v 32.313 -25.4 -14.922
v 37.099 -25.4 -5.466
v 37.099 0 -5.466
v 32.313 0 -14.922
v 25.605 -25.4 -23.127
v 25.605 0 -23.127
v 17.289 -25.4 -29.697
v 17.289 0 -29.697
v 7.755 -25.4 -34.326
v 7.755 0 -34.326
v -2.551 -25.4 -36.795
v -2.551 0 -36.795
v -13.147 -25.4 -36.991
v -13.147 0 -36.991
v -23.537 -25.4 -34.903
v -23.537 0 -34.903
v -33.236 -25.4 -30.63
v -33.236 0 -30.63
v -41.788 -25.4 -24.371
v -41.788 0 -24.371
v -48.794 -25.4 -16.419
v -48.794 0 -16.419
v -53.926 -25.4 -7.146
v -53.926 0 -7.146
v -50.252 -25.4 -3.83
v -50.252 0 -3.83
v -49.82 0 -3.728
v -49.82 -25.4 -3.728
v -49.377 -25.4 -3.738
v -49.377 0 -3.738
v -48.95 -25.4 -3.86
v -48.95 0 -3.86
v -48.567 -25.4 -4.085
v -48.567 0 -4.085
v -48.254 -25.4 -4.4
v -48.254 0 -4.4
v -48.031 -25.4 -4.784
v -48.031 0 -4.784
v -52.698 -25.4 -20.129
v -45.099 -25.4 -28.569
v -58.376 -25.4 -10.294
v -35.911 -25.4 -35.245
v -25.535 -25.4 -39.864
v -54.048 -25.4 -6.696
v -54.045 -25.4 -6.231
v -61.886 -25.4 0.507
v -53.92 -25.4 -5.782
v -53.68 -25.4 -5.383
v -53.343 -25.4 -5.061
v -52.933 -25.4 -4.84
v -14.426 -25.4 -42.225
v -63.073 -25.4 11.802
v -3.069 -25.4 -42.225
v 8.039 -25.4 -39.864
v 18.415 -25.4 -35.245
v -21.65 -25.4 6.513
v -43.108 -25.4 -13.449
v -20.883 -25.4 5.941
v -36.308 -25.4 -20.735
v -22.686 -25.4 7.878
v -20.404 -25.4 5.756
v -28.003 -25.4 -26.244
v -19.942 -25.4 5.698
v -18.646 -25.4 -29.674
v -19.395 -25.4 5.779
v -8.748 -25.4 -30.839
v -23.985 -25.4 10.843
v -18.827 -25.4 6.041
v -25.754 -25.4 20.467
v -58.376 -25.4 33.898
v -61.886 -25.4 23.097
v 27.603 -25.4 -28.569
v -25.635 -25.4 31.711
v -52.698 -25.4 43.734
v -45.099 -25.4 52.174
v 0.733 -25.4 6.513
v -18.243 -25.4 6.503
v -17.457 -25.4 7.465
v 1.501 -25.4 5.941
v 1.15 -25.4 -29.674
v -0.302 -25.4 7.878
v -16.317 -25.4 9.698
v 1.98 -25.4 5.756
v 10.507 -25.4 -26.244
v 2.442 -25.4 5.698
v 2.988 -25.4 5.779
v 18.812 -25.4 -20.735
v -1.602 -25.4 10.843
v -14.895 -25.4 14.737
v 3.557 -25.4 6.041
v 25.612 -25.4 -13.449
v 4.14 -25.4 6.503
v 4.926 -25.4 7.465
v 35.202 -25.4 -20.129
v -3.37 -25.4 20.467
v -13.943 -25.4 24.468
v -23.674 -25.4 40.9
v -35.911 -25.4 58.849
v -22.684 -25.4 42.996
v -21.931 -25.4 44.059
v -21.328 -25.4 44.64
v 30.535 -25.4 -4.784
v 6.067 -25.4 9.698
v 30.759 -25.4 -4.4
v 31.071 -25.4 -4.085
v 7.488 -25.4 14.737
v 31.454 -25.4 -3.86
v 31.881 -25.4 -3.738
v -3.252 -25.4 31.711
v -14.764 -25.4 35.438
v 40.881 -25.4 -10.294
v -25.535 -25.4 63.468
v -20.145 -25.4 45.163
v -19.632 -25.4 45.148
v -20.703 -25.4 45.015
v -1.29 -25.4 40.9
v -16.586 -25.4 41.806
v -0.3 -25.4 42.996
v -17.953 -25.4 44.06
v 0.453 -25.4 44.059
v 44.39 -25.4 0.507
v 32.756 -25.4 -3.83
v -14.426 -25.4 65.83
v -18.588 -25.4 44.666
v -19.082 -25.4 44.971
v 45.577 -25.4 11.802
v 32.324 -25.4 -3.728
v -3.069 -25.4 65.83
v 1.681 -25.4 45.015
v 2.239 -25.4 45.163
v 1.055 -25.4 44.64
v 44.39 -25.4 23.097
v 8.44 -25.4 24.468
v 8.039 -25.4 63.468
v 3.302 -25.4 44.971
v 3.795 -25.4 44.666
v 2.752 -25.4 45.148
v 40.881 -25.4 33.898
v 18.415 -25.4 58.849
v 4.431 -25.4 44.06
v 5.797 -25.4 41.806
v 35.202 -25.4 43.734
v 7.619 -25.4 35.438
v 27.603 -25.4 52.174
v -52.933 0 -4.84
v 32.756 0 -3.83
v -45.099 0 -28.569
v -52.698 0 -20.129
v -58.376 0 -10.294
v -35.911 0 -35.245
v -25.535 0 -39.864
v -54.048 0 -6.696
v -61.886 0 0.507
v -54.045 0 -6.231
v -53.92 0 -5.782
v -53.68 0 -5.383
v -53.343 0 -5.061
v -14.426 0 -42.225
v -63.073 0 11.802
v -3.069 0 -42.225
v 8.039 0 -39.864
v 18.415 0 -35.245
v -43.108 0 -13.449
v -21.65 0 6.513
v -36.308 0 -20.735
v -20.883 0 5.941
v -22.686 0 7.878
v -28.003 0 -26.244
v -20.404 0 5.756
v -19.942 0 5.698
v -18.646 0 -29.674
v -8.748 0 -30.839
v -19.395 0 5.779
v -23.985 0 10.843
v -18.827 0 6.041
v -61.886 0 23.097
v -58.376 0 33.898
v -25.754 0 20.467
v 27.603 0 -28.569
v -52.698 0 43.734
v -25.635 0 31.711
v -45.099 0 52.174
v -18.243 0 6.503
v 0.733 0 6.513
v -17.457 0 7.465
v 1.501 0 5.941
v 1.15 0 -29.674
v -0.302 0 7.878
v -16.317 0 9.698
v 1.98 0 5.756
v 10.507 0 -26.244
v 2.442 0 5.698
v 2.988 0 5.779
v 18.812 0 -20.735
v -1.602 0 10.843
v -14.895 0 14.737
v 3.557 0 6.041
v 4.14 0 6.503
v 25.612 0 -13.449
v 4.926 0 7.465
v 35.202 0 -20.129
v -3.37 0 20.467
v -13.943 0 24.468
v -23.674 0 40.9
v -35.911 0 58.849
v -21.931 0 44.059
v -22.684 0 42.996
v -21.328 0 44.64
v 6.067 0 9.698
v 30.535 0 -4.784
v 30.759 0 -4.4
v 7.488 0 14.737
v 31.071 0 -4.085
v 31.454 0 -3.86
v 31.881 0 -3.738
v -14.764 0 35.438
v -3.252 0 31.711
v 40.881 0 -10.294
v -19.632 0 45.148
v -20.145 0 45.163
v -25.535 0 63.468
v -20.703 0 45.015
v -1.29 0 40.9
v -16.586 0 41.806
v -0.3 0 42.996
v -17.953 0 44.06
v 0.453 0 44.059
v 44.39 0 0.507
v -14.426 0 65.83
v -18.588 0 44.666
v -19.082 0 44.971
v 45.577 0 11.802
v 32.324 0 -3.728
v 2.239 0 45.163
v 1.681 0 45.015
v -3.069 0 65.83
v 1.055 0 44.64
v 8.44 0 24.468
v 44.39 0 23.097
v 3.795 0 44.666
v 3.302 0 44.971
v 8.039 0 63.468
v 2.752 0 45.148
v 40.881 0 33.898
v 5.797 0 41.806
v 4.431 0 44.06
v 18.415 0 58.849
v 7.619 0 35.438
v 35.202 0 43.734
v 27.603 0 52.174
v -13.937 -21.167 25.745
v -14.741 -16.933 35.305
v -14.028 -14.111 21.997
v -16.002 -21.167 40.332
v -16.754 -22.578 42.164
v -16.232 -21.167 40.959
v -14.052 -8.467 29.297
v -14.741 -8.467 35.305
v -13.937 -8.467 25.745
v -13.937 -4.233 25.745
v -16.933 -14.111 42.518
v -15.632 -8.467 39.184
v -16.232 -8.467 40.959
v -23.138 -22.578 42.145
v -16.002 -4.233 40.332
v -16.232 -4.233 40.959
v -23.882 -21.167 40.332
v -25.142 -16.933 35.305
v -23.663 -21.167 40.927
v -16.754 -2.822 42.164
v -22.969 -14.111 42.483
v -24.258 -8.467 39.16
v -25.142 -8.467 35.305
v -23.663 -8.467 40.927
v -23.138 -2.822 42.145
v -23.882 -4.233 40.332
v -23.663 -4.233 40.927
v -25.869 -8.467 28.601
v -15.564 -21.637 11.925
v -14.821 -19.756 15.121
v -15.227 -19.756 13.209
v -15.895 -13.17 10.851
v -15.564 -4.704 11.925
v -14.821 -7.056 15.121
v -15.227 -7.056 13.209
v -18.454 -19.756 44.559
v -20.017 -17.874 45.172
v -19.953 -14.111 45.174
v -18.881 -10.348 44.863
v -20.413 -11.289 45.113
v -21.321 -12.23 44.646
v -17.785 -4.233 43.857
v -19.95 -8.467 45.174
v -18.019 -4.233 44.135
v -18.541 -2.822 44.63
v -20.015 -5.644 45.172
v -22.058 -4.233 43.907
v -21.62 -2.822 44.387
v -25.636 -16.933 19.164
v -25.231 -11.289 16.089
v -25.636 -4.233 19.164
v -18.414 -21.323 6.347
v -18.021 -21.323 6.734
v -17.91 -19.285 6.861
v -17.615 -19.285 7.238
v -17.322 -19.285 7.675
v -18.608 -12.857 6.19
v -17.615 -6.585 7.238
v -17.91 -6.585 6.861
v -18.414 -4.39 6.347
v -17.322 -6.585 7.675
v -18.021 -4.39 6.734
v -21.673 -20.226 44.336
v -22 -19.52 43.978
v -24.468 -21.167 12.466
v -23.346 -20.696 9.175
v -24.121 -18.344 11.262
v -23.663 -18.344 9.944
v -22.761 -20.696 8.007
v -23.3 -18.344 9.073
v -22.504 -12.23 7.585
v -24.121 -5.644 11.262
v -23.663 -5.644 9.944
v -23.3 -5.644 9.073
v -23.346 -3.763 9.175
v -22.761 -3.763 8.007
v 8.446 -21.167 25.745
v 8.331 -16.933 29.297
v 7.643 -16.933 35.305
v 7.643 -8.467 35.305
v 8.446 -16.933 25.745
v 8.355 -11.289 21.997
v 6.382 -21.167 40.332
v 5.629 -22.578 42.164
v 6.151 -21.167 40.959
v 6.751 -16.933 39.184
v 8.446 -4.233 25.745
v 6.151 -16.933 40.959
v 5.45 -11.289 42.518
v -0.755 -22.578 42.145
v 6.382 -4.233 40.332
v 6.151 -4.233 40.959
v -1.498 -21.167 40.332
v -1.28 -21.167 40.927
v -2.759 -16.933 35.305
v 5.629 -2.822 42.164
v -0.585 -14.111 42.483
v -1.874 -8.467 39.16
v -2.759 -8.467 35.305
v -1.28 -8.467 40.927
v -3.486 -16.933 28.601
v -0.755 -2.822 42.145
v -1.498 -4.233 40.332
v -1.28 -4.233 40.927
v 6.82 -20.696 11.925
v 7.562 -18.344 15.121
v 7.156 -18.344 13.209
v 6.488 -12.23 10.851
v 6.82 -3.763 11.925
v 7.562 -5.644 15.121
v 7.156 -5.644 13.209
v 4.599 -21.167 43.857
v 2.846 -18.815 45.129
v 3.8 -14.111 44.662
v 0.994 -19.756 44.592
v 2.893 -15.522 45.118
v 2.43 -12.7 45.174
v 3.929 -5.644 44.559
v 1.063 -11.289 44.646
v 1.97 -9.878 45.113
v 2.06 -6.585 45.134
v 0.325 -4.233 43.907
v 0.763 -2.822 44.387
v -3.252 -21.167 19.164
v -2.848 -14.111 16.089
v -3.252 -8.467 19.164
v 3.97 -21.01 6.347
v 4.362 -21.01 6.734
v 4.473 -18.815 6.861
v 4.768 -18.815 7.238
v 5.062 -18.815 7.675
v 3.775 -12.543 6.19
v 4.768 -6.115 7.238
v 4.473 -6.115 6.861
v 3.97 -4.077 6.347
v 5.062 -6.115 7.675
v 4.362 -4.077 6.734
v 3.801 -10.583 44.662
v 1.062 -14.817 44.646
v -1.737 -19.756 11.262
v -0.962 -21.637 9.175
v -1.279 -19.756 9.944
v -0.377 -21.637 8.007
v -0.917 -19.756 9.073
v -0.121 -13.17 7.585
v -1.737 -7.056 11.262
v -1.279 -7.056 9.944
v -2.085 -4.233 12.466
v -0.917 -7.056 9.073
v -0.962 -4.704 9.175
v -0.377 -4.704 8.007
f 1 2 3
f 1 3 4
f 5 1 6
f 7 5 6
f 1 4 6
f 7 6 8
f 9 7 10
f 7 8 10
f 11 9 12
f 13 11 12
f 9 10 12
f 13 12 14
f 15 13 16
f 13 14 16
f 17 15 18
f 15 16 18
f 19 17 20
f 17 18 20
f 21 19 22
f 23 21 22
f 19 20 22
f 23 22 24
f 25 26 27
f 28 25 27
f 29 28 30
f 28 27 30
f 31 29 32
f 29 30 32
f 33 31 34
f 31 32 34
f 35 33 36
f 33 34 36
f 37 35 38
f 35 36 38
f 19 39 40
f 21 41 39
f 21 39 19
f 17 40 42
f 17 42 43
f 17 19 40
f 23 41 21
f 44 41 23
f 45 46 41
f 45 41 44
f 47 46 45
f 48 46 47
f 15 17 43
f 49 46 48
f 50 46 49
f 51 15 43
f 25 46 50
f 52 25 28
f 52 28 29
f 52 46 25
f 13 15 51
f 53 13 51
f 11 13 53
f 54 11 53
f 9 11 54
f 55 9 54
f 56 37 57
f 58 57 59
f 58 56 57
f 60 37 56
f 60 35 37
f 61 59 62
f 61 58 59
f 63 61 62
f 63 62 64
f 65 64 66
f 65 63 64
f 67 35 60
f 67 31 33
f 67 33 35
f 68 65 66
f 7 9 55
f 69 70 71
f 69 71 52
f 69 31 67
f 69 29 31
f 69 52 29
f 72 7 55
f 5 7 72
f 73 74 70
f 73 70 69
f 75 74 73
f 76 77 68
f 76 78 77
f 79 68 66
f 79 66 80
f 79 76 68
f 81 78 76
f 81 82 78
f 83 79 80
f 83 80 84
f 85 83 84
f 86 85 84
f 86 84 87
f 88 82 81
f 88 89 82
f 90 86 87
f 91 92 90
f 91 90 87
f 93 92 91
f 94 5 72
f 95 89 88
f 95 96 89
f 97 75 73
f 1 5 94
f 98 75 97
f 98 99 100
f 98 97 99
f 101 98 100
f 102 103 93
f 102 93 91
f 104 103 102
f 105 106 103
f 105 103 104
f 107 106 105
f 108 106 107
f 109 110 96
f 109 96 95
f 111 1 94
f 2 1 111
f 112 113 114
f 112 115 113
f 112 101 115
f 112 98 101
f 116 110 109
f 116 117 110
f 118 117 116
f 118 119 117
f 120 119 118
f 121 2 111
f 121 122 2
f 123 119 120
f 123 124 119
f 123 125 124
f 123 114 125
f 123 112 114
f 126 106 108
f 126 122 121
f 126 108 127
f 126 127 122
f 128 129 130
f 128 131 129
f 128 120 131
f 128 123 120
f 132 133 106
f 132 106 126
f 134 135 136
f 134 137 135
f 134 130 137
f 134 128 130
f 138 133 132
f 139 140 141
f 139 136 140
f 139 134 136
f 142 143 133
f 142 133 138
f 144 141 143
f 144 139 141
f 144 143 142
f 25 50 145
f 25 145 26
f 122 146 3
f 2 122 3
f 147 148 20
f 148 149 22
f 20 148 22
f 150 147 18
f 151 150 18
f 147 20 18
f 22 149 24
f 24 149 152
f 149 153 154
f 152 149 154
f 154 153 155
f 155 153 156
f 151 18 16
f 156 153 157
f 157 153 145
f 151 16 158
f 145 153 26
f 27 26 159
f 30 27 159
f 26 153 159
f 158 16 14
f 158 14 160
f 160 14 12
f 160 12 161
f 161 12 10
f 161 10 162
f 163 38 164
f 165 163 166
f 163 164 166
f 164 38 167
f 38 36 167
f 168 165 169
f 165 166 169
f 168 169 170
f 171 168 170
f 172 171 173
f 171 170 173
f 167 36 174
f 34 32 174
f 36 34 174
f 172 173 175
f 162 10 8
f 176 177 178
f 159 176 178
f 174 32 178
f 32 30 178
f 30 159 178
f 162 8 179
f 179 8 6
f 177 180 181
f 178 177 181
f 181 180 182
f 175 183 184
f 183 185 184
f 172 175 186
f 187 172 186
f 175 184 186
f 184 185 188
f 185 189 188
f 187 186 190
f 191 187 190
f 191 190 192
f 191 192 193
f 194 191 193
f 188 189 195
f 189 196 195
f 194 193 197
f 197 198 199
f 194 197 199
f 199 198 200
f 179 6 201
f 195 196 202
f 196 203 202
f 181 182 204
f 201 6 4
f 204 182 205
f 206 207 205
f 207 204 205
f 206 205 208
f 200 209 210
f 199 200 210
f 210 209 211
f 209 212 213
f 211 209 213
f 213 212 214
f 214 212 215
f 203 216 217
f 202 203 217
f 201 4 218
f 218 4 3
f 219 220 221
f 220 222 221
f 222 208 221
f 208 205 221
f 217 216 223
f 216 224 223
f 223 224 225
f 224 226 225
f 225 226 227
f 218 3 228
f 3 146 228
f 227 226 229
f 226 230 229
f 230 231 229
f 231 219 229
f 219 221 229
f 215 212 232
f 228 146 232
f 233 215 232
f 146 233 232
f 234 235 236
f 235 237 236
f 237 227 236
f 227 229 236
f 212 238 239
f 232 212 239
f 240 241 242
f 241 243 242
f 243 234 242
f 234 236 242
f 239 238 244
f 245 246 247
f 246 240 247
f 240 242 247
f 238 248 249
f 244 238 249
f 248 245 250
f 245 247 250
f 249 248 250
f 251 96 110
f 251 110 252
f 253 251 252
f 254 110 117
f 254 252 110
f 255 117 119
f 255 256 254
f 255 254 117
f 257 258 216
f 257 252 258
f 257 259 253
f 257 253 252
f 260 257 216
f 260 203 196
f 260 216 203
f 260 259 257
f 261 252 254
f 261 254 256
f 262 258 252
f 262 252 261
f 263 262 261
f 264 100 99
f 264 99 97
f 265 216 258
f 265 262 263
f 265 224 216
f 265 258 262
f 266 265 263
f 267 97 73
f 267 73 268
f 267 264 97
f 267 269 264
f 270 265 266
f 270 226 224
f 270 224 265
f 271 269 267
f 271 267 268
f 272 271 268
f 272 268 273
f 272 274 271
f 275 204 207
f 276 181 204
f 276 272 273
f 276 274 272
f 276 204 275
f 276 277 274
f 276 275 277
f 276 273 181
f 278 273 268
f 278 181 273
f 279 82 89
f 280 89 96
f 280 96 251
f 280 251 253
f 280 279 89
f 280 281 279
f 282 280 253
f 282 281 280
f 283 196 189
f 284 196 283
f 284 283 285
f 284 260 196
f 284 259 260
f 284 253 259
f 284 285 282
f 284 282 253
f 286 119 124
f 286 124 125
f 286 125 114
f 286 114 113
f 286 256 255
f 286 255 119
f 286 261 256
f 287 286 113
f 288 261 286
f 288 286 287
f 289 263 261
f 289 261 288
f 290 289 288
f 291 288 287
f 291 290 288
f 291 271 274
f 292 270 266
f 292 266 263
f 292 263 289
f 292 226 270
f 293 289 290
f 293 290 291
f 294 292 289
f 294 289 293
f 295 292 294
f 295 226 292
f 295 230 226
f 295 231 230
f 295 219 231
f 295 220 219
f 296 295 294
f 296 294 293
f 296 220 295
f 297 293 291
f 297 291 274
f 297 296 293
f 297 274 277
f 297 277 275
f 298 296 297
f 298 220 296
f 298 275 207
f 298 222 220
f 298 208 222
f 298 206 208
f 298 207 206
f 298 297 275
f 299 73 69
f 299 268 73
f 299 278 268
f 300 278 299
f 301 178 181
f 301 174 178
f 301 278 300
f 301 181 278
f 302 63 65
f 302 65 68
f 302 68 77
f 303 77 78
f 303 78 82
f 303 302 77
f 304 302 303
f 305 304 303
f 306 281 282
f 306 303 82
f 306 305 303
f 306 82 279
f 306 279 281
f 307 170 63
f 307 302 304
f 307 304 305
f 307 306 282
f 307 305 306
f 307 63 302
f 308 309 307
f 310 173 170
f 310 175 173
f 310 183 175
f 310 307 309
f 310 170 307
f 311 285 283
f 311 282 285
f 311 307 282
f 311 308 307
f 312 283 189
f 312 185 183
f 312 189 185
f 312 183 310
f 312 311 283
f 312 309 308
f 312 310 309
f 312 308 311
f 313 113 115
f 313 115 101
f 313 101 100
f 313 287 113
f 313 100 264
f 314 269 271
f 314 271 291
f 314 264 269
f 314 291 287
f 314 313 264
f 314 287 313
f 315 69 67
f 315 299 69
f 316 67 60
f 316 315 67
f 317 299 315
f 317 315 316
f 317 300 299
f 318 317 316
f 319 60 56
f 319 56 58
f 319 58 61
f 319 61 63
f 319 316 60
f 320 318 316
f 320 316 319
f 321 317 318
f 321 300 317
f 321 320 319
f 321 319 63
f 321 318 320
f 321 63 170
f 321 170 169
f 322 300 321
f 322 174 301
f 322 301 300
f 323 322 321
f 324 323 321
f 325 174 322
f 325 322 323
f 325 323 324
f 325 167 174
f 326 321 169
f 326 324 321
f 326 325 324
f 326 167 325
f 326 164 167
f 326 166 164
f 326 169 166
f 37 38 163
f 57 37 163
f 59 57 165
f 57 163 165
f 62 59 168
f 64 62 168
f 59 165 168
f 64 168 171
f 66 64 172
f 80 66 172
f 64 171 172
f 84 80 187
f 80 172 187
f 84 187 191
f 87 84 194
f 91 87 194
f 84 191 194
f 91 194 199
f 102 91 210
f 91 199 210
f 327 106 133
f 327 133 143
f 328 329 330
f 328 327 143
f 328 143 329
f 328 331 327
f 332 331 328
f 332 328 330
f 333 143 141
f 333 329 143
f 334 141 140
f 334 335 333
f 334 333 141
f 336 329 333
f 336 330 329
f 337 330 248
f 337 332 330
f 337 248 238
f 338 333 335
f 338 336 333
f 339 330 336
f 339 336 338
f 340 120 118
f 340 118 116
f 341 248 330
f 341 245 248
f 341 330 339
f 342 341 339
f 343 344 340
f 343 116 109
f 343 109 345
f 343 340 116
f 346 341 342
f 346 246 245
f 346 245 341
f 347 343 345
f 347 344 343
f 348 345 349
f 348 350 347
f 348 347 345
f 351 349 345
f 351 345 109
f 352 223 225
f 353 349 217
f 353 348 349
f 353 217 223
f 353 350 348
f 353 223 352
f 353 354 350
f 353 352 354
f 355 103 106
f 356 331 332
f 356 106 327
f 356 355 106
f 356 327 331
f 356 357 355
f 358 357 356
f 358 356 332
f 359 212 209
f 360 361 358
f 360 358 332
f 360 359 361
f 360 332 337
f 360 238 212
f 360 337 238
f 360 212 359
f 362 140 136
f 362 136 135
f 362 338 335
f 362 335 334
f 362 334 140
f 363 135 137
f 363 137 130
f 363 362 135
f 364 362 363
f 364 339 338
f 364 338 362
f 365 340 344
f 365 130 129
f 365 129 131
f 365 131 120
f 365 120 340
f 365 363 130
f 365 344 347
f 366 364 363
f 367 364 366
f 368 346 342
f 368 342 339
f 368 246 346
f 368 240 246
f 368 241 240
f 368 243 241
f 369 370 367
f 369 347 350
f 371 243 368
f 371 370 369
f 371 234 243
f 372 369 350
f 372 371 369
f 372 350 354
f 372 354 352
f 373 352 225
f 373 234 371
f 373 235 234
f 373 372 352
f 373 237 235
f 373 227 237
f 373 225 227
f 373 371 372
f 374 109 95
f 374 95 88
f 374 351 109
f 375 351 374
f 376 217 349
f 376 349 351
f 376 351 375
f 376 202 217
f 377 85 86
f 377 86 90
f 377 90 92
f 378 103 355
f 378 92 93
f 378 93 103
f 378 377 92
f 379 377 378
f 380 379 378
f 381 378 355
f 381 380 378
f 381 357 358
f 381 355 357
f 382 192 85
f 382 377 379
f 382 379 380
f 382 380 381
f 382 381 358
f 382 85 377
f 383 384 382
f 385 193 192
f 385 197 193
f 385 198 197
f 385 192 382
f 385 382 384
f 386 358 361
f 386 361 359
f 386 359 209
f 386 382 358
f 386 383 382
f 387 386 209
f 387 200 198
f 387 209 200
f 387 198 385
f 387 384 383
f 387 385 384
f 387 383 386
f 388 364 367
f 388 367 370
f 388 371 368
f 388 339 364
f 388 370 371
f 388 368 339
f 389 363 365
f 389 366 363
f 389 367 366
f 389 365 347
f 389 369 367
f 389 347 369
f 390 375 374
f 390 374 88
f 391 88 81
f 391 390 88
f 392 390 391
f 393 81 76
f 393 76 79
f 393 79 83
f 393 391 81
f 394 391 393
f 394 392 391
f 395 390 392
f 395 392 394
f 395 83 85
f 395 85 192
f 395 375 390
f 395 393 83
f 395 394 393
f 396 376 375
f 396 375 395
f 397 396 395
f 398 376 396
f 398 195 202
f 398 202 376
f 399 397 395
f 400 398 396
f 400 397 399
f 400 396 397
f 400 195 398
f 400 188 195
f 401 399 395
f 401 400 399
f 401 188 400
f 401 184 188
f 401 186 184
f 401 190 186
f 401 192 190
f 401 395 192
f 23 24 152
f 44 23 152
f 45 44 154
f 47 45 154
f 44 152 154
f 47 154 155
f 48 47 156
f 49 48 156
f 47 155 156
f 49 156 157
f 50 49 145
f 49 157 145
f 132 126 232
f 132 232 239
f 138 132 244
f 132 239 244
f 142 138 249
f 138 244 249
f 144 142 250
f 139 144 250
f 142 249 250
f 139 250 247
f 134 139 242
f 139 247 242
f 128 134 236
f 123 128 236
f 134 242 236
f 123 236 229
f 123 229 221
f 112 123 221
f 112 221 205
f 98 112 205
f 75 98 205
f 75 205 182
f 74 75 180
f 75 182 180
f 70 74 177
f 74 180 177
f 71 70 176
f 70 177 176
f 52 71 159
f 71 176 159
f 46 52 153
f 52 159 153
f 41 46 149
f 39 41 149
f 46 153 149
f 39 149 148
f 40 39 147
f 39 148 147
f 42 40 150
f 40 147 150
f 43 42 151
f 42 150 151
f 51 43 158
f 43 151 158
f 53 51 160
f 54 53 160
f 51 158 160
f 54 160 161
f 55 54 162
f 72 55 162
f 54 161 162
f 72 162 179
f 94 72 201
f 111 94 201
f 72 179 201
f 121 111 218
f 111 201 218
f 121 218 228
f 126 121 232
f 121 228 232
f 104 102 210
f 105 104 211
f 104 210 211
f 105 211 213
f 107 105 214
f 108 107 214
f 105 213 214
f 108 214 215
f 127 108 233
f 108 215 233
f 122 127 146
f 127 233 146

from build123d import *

# Parameters (mm, degrees)
F0_R     = 54.325127
F1_DEPTH = 25.4


with BuildPart() as f1:
    # F0 (on Front) → F1 (new body)
    with BuildSketch(Plane.XZ):
        with Locations((-8.747967, 11.802168)):
            Circle(F0_R)
        with BuildLine():
            ThreePointArc((37.098999, -5.465902), (-7.843683, -37.180613), (-53.926329, -7.146345))
            ThreePointArc((-53.926329, -7.146345), (-53.919784, -5.781959), (-52.932832, -4.839878))
            Line((-52.932832, -4.839878), (-50.252366, -3.830292))
            ThreePointArc((-50.252366, -3.830292), (-48.949705, -3.859817), (-48.031127, -4.783943))
            ThreePointArc((-48.031127, -4.783943), (-8.747967, -30.838959), (30.535192, -4.783943))
            ThreePointArc((30.535192, -4.783943), (31.453771, -3.859817), (32.756431, -3.830292))
            Line((32.756431, -3.830292), (37.098999, -5.465902))
        make_face(mode=Mode.SUBTRACT)
        with BuildLine():
            add(Edge.make_bspline(
                [(-19.941593, 5.697598), (-9.539958, 5.697598), (-14.740775, 35.304761), (-19.941593, 64.911923), (-25.14241, 35.304761), (-30.343227, 5.697598), (-19.941593, 5.697598)],
                knots=[0, 0, 0, 2.094395, 2.094395, 4.18879, 4.18879, 6.283185, 6.283185, 6.283185], degree=2, weights=[1, 0.5, 1, 0.5, 1, 0.5, 1]))
        make_face(mode=Mode.SUBTRACT)
        with BuildLine():
            add(Edge.make_bspline(
                [(2.441827, 5.697598), (12.843461, 5.697598), (7.642644, 35.304761), (2.441827, 64.911923), (-2.75899, 35.304761), (-7.959807, 5.697598), (2.441827, 5.697598)],
                knots=[0, 0, 0, 2.094395, 2.094395, 4.18879, 4.18879, 6.283185, 6.283185, 6.283185], degree=2, weights=[1, 0.5, 1, 0.5, 1, 0.5, 1]))
        make_face(mode=Mode.SUBTRACT)
    extrude(amount=F1_DEPTH)


solid = f1.part
